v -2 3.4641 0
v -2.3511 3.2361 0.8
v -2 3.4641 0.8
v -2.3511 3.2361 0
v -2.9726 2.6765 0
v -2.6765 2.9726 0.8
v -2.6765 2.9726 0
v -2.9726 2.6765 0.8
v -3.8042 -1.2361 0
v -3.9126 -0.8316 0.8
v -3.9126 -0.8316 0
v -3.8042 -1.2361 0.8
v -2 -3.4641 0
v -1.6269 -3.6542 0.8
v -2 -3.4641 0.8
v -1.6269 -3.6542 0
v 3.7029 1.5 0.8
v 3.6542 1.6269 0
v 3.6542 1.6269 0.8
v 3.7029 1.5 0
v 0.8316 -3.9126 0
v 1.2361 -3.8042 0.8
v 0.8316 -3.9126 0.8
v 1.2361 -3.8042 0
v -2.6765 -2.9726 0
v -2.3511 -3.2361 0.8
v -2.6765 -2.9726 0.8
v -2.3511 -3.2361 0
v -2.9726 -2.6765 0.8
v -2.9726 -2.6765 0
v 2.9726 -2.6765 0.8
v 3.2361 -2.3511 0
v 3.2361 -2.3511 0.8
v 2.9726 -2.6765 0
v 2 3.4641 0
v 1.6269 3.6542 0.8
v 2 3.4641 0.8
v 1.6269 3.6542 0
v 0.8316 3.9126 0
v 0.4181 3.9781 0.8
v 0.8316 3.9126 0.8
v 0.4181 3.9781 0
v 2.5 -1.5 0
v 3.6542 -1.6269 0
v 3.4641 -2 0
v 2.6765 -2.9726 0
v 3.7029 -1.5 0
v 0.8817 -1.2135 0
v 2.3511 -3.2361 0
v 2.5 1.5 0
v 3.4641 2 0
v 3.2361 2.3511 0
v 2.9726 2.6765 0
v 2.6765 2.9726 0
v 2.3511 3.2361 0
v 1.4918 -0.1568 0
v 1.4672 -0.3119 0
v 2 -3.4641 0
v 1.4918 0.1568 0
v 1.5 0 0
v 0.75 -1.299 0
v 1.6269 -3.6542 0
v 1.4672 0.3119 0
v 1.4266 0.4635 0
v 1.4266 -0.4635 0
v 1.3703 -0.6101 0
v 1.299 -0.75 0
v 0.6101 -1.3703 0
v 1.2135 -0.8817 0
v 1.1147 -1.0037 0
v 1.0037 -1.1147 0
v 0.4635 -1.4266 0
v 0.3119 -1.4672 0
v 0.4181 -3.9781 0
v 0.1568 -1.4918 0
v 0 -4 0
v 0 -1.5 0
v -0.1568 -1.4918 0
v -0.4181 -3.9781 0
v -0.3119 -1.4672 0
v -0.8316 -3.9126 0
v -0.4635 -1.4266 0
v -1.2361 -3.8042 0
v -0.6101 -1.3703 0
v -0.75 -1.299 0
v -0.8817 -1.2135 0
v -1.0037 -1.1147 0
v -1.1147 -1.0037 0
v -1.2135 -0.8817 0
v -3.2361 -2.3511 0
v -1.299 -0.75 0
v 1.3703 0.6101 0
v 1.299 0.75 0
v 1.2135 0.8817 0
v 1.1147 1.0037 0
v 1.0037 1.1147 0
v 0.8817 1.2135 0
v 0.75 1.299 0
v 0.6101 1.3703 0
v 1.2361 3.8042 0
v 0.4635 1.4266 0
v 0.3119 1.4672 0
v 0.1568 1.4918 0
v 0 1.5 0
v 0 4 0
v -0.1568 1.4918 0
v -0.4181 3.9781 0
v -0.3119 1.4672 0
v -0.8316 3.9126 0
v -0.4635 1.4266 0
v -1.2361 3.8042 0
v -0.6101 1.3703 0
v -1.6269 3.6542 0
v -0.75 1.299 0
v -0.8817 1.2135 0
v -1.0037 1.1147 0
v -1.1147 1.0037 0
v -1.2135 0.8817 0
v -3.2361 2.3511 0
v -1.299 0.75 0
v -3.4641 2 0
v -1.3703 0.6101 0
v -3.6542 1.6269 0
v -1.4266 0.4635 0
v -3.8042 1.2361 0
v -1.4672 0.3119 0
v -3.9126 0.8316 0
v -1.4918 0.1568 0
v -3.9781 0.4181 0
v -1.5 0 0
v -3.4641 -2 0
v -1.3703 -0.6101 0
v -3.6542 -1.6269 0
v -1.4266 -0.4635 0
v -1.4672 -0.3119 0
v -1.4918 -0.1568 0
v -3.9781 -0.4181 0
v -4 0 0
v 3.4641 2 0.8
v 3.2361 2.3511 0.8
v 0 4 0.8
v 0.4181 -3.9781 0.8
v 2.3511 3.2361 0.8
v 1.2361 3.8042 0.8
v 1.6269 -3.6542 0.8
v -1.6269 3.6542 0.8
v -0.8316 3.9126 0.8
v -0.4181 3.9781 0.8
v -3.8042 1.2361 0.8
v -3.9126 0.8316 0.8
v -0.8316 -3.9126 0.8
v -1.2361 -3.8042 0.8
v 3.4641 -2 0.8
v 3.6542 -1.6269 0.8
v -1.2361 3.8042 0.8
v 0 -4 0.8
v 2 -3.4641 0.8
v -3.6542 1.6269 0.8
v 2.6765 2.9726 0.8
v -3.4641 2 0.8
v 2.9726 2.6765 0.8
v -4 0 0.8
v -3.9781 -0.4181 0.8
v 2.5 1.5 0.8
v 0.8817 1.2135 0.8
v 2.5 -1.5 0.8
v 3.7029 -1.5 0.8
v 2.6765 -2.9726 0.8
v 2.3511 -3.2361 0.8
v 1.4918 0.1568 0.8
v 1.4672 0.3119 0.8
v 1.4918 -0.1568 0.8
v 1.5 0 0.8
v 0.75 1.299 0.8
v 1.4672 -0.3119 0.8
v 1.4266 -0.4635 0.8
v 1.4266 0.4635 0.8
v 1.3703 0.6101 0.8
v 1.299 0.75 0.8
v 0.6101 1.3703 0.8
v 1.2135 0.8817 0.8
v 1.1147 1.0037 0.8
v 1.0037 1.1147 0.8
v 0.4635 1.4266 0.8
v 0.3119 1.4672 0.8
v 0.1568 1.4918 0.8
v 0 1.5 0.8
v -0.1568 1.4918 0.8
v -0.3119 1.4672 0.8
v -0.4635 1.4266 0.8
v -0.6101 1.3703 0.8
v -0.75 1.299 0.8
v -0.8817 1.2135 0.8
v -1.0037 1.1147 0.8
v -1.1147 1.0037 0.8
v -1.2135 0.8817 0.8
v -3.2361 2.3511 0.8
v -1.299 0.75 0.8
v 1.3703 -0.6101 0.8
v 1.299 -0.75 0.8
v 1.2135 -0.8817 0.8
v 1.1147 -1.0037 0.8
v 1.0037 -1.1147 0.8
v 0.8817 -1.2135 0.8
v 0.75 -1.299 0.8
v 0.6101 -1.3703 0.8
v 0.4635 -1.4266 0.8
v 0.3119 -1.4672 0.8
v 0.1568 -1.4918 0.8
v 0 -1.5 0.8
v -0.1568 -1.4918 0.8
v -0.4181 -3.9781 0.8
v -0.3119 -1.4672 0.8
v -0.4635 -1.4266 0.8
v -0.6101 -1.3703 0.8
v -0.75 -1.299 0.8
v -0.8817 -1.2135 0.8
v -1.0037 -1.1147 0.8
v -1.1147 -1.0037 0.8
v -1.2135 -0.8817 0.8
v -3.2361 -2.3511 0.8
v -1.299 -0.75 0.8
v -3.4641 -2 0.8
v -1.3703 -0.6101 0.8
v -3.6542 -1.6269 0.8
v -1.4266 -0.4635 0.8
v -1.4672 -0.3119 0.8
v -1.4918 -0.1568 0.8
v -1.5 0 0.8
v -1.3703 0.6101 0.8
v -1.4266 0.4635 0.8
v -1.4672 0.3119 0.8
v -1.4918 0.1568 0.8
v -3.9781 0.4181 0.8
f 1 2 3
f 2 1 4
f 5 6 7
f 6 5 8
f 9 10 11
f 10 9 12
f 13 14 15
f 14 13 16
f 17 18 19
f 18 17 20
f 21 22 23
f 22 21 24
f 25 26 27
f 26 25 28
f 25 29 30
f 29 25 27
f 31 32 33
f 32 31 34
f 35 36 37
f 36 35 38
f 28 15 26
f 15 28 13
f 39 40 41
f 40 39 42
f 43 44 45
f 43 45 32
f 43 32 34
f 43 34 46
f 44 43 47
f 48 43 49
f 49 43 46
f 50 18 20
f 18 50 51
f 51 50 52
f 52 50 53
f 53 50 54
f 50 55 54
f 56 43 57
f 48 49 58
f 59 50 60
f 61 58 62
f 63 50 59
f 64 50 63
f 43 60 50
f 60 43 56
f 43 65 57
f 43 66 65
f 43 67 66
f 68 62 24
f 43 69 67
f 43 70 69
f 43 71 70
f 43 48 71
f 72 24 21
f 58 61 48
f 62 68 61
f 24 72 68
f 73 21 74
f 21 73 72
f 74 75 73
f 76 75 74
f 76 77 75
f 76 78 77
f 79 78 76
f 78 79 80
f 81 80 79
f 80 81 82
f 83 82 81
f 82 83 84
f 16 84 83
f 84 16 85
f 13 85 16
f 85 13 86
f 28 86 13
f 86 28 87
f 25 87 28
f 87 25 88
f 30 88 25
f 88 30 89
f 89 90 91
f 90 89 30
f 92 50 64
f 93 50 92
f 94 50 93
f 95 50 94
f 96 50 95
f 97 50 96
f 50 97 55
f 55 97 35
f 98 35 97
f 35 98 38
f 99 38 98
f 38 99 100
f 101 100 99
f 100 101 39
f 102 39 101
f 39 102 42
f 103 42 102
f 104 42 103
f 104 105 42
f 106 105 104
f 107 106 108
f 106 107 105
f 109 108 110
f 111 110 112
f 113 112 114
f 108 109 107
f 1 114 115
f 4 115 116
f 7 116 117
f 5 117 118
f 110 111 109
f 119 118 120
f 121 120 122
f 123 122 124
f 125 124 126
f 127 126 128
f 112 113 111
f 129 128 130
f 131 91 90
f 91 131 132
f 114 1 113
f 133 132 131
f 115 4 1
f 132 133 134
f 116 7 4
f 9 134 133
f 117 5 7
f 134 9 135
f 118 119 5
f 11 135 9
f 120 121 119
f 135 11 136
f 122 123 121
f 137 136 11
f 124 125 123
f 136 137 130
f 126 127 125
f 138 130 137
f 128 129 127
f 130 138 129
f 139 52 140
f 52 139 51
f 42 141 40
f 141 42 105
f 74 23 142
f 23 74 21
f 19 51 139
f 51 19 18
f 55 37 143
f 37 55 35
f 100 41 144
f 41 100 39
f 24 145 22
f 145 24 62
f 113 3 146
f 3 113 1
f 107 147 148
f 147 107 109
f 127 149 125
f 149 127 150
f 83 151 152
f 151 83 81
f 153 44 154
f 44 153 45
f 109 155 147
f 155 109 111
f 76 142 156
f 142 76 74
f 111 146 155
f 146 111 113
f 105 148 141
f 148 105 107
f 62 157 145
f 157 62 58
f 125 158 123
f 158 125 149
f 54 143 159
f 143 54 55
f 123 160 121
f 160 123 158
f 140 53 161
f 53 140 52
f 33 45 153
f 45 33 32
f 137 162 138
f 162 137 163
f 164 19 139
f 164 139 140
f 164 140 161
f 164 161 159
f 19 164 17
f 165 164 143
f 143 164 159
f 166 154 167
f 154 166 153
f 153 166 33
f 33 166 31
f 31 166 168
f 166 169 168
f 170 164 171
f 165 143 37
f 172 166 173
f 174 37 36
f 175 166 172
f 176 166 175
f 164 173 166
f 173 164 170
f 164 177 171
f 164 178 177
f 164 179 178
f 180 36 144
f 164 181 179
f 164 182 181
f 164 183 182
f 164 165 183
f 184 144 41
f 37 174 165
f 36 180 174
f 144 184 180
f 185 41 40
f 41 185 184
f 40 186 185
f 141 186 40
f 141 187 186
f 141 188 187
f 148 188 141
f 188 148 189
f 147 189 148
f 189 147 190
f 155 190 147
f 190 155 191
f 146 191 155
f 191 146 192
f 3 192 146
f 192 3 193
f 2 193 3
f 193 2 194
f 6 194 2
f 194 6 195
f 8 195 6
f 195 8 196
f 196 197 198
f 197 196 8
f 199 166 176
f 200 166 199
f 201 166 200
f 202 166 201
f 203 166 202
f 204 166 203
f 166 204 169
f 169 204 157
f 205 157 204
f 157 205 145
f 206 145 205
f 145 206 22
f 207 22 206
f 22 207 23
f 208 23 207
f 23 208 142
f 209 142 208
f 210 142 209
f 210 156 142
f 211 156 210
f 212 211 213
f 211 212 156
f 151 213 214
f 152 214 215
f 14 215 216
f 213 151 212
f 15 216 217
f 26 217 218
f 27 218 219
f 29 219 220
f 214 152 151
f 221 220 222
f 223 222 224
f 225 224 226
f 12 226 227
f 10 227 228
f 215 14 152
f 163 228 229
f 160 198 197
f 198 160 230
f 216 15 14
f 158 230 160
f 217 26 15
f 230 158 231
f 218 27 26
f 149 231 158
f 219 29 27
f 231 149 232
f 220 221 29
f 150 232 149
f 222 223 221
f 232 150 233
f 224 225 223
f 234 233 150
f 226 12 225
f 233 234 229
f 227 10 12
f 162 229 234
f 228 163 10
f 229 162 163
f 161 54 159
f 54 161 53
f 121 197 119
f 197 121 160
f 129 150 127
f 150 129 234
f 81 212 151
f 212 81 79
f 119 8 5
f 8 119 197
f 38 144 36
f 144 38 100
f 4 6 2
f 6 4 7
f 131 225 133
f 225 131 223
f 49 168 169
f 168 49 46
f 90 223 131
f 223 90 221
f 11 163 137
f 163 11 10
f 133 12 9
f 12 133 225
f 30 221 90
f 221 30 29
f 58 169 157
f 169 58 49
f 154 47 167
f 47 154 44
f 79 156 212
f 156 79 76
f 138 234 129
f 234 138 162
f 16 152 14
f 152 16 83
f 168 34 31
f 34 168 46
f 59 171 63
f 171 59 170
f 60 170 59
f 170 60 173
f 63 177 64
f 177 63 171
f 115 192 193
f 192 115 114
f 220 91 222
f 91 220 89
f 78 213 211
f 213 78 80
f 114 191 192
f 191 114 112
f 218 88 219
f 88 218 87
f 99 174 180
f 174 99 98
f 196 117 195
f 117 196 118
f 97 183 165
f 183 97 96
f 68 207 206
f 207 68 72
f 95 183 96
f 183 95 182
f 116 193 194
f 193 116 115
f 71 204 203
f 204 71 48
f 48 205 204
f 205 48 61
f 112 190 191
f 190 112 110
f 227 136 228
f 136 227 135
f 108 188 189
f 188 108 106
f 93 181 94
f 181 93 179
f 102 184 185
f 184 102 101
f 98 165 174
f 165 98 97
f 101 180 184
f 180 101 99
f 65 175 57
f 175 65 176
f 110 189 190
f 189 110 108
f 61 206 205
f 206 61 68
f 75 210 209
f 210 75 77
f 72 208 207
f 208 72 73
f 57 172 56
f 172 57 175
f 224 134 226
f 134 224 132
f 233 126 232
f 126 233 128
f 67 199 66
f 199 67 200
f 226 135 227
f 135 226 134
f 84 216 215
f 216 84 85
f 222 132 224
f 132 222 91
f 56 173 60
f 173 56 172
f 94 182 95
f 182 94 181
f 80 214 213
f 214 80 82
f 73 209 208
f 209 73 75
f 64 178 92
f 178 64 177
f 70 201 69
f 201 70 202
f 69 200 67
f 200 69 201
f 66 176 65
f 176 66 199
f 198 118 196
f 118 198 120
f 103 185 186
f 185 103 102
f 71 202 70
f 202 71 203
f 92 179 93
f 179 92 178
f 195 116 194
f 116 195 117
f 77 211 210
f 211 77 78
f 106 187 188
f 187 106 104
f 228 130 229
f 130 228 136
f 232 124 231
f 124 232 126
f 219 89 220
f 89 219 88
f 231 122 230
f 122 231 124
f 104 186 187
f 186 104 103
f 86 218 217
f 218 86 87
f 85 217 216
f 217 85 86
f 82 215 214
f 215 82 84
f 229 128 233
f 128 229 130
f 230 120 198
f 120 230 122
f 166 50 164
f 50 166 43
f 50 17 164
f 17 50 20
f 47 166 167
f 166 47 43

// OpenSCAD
// External retaining ring with installation gap.
$fn = 60;
eps = 0.02;
shaft_d = 3;
outer_d = 8;
thickness = 0.8;
gap = 3;
difference() {
    cylinder(d = outer_d, h = thickness);
    translate([0, 0, -eps]) cylinder(d = shaft_d, h = thickness + 2 * eps);
    translate([outer_d / 2 - gap / 2, -gap / 2, -eps]) cube([gap + eps, gap, thickness + 2 * eps]);
}
